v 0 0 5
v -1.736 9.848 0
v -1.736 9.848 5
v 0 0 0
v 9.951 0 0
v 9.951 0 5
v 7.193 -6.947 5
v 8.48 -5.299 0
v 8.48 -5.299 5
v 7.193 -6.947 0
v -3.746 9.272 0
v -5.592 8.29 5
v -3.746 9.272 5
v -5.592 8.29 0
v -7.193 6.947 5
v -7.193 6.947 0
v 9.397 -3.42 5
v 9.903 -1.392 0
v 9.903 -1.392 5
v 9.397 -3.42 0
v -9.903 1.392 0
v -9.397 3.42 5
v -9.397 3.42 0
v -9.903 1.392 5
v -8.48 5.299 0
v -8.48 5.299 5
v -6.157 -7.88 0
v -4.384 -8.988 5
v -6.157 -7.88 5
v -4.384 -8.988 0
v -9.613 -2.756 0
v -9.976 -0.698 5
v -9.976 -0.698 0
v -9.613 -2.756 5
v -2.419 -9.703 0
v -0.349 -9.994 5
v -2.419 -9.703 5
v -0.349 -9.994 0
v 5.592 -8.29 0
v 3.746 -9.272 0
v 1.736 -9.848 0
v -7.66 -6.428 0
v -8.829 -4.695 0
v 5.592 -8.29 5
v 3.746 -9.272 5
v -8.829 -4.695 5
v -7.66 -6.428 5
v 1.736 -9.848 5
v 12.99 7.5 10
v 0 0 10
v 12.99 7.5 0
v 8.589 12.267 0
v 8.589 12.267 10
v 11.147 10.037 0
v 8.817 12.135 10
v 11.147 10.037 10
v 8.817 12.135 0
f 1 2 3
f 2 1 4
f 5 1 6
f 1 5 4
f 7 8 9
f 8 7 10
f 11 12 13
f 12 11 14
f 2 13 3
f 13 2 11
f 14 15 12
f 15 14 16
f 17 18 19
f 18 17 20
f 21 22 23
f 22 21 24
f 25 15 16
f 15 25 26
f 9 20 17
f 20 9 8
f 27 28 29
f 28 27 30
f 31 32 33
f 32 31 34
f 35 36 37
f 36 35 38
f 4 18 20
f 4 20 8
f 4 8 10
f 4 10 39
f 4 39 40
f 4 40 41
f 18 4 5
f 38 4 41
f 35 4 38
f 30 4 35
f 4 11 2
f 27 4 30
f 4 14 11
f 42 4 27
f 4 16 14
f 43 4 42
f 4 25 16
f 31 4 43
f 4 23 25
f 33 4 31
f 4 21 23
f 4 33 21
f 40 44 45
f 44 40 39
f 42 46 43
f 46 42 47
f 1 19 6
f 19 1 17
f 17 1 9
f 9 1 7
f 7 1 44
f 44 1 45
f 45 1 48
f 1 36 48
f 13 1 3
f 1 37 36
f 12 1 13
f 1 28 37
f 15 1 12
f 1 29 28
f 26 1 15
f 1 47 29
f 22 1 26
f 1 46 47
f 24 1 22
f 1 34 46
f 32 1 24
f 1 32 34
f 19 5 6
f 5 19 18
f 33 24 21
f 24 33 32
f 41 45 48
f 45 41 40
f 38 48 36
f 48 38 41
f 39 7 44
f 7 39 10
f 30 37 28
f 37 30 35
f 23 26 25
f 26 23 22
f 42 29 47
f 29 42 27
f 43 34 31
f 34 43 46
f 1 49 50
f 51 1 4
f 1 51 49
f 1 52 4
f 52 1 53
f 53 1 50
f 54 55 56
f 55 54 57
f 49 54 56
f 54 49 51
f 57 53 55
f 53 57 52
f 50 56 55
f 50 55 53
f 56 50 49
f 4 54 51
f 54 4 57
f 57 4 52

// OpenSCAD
// PieTest

/**
* @author: Marcel Jira

 * This module generates a pie slice in OpenSCAD. It is inspired by the
 * [dotscad](https://github.com/dotscad/dotscad)
 * project but uses a different approach.
 * I cannot say if this approach is worse or better.

 * @param float radius Radius of the pie
 * @param float angle  Angle (size) of the pie to slice
 * @param float height Height (thickness) of the pie
 * @param float spin   Angle to spin the slice on the Z axis
 */
module pie(radius, angle, height, spin=0) {
	// calculations
	ang = angle % 360;
	absAng = abs(ang);
	halfAng = absAng % 180;
	negAng = min(ang, 0);

	// submodules
	module pieCube() {
		translate([-radius - 1, 0, -1]) {
			cube([2*(radius + 1), radius + 1, height + 2]);
		}
	}

	module rotPieCube() {
		rotate([0, 0, halfAng]) {
			pieCube();
		}
	}
	if (angle != 0) {
		if (ang == 0) {
			cylinder(r=radius, h=height);
		} else {
			rotate([0, 0, spin + negAng]) {
				intersection() {
					cylinder(r=radius, h=height);
					if (absAng < 180) {
						difference() {
							pieCube();
							rotPieCube();
						}
					} else {
						union() {
							pieCube();
							rotPieCube();
						}
					}
				}
			}
		}
	}
}

/**
 * When used as a module (statement "use <pie.scad>") the example below will not
 * render. If you run this file alone, it will :)
 */

pie(radius=10, angle=-260, height=5, spin = 0);
pie(radius=15, angle=25, height = 10, spin = 30);
